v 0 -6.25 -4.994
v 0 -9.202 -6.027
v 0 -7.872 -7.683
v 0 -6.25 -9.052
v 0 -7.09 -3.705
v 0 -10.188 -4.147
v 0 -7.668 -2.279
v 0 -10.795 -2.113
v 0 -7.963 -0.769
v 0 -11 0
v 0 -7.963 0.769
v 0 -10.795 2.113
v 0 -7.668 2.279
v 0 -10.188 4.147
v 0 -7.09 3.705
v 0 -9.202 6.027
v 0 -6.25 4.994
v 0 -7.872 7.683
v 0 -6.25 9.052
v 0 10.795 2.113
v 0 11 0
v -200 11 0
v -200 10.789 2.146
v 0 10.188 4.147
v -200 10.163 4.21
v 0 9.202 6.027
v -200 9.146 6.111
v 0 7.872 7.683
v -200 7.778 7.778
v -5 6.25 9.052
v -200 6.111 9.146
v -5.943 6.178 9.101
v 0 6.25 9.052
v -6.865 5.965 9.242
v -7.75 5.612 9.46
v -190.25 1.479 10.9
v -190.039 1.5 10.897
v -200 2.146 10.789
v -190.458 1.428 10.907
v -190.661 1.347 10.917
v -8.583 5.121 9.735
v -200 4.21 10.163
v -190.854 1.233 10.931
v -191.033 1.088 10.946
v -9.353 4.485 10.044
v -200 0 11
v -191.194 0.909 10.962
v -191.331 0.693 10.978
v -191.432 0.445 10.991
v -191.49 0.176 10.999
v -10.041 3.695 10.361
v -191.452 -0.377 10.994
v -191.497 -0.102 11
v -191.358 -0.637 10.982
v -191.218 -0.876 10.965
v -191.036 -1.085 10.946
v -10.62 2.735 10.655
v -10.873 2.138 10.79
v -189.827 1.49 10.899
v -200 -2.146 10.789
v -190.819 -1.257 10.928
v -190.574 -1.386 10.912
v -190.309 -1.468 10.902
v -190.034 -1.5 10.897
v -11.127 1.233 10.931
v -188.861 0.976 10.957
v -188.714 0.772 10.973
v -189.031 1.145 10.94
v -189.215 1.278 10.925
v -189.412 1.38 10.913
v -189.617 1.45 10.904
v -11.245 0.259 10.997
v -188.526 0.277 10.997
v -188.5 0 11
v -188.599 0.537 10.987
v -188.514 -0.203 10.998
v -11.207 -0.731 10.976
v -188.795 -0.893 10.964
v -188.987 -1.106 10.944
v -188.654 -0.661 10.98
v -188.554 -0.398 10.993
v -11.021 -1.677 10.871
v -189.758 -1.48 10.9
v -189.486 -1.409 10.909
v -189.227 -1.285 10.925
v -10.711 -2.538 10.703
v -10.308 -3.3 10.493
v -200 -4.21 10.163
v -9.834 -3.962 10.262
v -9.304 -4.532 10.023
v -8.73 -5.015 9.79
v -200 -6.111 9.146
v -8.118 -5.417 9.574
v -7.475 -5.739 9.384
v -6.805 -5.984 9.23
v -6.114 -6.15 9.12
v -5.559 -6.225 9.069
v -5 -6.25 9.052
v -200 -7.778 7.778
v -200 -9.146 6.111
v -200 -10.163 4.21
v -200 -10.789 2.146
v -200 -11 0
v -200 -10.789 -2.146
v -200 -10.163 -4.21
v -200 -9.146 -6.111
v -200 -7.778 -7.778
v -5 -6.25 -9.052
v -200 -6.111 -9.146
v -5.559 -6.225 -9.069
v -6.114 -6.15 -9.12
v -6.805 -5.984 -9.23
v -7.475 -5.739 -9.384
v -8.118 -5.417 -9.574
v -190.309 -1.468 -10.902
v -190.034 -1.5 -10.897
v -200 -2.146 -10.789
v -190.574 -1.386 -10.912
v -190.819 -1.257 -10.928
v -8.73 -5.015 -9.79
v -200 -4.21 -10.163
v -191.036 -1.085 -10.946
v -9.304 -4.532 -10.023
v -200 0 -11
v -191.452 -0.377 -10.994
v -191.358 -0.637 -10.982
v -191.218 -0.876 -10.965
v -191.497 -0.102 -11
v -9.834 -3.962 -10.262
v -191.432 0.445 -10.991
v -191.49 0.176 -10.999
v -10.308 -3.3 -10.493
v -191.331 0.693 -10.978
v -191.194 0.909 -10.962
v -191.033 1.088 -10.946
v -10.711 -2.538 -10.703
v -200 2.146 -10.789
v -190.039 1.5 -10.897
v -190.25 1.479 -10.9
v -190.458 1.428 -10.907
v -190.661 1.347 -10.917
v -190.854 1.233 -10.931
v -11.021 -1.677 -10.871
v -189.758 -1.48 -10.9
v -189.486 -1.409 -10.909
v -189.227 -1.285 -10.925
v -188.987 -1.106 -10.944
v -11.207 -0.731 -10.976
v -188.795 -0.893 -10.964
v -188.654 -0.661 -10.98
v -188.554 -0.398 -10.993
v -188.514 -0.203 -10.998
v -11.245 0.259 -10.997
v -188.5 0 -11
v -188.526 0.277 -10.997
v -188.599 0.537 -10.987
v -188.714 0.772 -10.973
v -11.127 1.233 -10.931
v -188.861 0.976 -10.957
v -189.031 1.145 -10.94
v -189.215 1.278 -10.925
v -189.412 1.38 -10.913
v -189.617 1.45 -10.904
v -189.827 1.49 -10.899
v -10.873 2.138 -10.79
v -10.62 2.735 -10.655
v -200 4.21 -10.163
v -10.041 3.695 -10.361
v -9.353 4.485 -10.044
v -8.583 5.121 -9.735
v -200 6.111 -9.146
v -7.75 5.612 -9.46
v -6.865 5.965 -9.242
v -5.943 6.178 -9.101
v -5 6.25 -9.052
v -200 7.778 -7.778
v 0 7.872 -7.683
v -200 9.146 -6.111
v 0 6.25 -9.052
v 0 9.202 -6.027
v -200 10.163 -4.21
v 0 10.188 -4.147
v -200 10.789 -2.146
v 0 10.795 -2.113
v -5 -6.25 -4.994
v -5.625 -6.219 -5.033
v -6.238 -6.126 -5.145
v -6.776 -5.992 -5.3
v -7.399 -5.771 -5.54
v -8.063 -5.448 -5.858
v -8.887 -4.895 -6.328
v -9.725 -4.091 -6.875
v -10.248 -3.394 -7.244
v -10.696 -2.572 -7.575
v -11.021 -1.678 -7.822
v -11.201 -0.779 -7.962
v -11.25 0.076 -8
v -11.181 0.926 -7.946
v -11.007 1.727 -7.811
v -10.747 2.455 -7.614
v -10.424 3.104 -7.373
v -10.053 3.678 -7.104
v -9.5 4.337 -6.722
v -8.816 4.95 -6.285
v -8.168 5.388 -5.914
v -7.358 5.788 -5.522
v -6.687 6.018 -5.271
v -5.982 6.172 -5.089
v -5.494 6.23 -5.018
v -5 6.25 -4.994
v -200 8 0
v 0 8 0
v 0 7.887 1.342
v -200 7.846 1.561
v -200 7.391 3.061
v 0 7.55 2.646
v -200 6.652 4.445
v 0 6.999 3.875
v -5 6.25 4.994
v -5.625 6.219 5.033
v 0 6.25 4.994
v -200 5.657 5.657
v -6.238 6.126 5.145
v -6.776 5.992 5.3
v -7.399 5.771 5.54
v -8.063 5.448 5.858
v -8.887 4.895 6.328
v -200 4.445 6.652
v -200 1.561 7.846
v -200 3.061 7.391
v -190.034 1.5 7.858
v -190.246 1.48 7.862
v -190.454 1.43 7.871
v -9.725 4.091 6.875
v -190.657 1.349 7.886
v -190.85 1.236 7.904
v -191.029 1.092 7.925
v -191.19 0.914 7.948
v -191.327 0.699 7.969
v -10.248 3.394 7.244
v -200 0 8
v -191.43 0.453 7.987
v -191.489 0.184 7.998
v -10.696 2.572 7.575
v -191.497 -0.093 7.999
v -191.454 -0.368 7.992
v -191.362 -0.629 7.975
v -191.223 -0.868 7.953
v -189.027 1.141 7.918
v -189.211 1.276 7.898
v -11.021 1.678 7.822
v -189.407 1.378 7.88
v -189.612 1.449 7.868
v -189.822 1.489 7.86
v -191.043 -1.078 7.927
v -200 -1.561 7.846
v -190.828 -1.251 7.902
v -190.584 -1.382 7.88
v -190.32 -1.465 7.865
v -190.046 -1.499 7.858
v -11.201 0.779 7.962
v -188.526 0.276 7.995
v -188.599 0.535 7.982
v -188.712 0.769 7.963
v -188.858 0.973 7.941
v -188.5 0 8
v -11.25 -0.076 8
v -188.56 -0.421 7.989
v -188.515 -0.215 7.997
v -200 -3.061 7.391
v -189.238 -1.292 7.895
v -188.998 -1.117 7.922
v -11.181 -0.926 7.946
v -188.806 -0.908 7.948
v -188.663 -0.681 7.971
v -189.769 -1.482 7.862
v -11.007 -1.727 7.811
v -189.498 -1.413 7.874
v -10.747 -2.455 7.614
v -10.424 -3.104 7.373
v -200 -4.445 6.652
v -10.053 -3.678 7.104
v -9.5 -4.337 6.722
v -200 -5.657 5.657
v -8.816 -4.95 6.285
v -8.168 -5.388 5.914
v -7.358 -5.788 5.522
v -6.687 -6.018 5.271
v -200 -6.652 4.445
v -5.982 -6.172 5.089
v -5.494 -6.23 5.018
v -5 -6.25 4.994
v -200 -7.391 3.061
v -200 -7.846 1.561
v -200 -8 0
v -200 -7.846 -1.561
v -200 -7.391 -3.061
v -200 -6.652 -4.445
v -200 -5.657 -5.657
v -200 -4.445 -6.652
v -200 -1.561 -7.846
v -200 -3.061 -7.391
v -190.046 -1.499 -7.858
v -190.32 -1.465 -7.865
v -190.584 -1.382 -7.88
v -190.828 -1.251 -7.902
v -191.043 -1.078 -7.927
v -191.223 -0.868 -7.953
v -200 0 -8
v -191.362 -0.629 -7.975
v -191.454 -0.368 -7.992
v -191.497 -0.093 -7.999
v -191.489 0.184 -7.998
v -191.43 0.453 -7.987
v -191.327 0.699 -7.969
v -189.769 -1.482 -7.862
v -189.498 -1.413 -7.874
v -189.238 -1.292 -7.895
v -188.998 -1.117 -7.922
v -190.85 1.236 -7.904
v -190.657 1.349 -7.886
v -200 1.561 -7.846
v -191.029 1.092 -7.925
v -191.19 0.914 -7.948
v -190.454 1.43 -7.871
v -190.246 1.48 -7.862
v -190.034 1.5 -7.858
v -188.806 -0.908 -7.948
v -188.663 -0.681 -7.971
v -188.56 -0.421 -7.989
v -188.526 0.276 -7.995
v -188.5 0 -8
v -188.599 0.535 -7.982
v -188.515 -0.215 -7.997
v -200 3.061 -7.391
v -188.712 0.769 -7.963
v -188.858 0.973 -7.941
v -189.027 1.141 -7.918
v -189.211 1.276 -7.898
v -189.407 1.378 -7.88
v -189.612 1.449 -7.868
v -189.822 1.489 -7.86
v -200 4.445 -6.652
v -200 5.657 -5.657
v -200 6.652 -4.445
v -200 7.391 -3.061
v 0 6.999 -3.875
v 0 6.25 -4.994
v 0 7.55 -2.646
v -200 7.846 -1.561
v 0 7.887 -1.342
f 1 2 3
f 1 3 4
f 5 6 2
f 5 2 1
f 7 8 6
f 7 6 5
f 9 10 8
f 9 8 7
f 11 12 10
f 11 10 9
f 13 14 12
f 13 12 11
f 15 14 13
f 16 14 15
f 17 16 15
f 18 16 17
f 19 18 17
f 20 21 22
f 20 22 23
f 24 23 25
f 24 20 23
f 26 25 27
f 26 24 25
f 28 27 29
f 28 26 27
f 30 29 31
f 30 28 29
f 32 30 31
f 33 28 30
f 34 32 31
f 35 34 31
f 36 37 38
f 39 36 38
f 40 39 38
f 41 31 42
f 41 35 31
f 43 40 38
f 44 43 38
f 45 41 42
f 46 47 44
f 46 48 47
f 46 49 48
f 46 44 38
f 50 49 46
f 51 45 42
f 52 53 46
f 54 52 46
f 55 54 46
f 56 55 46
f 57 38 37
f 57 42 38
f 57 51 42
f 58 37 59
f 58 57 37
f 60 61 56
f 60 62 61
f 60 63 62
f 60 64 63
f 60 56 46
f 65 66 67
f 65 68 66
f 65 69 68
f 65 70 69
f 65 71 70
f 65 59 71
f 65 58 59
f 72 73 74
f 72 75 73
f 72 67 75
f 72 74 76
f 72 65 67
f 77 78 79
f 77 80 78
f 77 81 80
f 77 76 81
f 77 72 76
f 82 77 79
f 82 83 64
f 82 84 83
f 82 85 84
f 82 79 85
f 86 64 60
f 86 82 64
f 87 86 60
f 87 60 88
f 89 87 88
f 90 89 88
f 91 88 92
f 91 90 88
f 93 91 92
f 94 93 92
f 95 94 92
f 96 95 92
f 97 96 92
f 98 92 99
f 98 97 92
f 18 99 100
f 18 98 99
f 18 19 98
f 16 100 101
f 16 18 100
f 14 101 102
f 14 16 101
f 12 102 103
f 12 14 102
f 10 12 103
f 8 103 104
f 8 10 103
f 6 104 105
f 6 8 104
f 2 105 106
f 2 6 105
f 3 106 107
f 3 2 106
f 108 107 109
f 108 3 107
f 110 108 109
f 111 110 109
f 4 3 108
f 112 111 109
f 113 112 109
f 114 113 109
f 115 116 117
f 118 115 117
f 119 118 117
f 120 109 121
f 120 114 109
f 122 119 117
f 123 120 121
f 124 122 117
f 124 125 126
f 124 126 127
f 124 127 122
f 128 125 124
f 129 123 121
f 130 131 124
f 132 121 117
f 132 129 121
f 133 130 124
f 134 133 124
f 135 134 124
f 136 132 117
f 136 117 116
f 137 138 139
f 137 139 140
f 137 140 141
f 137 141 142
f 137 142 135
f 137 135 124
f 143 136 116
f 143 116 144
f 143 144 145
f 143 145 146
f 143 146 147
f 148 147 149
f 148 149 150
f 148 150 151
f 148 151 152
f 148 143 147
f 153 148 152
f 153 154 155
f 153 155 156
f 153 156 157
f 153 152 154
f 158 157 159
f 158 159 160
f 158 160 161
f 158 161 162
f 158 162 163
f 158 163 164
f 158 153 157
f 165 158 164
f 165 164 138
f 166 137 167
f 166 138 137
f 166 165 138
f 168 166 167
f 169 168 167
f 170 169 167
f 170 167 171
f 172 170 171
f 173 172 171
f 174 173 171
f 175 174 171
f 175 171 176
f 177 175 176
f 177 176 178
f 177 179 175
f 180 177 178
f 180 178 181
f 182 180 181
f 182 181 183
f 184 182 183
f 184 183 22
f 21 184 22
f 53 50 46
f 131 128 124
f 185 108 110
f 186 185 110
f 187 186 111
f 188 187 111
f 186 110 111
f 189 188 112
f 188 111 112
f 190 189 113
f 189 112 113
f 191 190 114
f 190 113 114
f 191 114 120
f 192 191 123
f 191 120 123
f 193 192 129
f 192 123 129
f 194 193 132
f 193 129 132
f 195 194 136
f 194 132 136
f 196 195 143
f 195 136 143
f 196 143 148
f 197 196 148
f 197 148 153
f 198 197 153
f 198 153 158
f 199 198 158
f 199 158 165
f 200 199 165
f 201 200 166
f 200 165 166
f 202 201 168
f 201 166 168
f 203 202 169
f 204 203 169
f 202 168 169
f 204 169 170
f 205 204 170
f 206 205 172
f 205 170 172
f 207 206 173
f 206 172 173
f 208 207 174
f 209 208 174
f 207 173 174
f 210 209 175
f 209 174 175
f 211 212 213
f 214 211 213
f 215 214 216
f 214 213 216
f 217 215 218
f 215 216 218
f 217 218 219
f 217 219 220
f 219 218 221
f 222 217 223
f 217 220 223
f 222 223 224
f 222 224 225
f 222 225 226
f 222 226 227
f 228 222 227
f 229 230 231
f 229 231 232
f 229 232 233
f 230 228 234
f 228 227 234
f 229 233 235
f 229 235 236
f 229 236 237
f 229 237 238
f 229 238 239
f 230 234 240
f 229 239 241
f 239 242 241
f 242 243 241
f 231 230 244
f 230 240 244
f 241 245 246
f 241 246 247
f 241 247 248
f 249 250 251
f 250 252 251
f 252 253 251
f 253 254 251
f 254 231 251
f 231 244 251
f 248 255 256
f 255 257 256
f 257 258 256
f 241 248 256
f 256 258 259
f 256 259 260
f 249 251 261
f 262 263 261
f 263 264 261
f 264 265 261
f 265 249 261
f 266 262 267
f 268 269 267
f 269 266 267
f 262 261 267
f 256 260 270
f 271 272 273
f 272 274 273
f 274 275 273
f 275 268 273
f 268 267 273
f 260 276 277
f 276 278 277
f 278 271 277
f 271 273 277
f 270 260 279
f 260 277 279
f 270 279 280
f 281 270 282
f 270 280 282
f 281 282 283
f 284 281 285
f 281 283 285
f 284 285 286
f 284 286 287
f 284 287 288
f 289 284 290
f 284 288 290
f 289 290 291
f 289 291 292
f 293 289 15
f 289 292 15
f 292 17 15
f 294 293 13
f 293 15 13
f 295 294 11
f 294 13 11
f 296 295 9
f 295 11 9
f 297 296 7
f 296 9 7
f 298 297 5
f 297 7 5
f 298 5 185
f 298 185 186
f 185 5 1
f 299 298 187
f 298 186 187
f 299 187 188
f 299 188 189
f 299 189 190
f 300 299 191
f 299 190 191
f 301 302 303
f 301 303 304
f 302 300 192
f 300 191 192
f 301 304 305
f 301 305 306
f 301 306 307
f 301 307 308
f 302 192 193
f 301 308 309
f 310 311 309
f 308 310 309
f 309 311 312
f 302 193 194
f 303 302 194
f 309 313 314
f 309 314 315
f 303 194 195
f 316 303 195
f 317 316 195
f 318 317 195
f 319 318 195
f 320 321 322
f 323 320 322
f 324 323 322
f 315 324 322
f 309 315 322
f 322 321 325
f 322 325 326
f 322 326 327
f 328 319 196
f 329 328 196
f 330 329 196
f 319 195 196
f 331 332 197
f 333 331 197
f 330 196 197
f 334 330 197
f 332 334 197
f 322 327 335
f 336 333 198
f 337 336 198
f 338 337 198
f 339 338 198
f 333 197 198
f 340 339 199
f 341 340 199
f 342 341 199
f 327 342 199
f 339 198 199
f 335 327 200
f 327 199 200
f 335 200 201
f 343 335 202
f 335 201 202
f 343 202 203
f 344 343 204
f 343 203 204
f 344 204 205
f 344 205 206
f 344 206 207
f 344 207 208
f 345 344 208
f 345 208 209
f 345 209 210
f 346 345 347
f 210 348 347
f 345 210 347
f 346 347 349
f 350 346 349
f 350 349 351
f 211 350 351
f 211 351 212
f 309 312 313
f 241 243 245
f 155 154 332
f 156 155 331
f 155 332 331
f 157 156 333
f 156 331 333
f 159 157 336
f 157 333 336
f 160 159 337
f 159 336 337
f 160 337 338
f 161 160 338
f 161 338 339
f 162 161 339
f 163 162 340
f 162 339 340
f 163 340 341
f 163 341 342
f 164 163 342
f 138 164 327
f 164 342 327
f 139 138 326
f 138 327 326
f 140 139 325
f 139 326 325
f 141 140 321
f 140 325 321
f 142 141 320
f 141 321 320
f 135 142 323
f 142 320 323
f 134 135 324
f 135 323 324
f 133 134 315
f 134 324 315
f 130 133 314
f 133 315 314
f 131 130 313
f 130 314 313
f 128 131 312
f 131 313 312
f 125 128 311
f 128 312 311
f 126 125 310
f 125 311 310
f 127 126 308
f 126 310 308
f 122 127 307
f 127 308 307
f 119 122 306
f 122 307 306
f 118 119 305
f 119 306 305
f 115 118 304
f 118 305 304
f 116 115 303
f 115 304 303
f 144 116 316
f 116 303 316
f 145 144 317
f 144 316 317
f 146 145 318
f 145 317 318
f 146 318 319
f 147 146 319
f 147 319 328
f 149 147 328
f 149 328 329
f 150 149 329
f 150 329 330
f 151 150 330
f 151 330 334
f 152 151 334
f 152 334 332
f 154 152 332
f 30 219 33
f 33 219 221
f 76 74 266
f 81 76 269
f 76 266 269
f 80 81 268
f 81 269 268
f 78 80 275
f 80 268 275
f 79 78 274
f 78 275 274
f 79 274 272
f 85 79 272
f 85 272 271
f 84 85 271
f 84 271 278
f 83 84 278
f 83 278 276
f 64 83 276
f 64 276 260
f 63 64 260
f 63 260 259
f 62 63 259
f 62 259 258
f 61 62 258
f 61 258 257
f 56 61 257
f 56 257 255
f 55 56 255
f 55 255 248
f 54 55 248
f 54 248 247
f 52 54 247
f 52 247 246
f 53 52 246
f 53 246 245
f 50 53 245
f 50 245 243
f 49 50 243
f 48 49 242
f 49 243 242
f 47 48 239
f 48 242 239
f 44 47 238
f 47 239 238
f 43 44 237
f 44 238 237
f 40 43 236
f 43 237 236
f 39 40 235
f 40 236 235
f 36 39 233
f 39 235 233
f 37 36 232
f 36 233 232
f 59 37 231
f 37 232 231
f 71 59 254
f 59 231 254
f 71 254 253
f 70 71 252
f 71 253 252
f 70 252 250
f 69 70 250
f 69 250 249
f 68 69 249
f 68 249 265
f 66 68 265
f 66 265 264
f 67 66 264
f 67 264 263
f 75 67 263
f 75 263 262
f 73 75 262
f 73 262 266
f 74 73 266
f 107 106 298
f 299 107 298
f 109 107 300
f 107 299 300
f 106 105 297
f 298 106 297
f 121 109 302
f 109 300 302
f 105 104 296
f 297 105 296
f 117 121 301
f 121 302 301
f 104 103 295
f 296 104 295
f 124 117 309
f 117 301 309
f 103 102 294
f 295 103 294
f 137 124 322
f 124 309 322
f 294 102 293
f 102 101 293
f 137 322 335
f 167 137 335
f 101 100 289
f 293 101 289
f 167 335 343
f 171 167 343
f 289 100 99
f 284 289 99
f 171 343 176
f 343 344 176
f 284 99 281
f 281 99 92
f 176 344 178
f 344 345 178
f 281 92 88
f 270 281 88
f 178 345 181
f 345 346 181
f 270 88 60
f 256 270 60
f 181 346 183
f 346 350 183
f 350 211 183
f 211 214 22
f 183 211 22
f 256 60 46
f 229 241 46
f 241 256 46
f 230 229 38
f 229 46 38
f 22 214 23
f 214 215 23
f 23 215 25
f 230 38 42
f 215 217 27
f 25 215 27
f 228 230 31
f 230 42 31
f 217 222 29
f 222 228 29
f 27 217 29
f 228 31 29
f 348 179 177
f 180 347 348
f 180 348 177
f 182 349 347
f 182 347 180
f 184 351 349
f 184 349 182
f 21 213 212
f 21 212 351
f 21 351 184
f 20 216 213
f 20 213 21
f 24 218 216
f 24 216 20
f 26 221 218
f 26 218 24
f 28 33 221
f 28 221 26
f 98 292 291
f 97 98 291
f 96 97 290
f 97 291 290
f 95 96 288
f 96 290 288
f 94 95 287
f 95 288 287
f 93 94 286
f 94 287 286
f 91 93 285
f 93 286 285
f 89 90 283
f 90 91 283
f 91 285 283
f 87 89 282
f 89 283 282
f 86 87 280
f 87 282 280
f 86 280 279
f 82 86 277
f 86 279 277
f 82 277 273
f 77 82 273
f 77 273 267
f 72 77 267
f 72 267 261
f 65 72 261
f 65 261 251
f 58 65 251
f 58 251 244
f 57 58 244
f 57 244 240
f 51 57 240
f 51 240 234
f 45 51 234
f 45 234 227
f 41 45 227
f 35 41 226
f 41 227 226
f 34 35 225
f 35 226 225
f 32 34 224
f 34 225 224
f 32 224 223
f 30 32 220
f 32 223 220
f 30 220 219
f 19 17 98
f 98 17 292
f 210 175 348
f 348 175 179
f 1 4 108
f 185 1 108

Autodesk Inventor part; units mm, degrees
ref_plane "YZ Plane" through (0, 0, 0) normal (1, 0, 0) x (0, 1, 0)
ref_plane "XZ Plane" through (0, 0, 0) normal (0, 1, 0) x (-1, 0, 0)
ref_plane "XY Plane" through (0, 0, 0) normal (0, 0, 1) x (1, 0, 0)
sketch "スケッチ1" plane through (0, 0, 0) normal (1, 0, 0) x (0, 1, 0)
  circle A0 centre (0, 0) radius 11
  circle A1 centre (0, 0) radius 8
  dimension "d0" = 22
  dimension "d1" = 16
extrude "押し出し1" add sketch "スケッチ1" against normal blind 200
sketch "スケッチ2" plane through (0, 0, 0) normal (0, 0, 1) x (1, 0, 0)
  line L0 (0, 0) -> (0, 6.25)
  line L1 (0, -11) -> (0, 11) projected
  line L2 (0, 0) -> (0, -6.25)
  line L3 (0, -6.25) -> (-5, -6.25)
  line L4 (-5, -6.25) -> (-5, 6.25)
  line L5 (-5, 6.25) -> (0, 6.25)
  dimension "d4" = 6.25
  dimension "d5" = 6.25
  dimension "d6" = 5
extrude "押し出し2" cut sketch "スケッチ2" along normal mid plane 200
sketch "スケッチ3" plane through (0, 0, 0) normal (0, 0, 1) x (1, 0, 0)
  line L0 (-5, -6.25) -> (-5, 6.25) projected
  circle A0 centre (-5, 0) radius 6.25
  point P0 (0, 0)
extrude "押し出し3" cut sketch "スケッチ3" along normal mid plane 200 contours A0 L0 picked at (-7.0681, 0.2511)
sketch "スケッチ4" plane through (0, 0, 0) normal (0, 0, 1) x (1, 0, 0)
  circle A0 centre (-190, 0) radius 1.5
  point P0 (0, 0)
  dimension "d11" = 3
extrude "押し出し4" cut sketch "スケッチ4" along normal mid plane 200
thread "ねじ1" size "M3x0.5" class "6H" standard "ANSI Metric M Profile" full length
thread "ねじ2" size "M3x0.5" class "6H" standard "ANSI Metric M Profile" full length
properties part number "vp16_200" material "PVC 配管"
